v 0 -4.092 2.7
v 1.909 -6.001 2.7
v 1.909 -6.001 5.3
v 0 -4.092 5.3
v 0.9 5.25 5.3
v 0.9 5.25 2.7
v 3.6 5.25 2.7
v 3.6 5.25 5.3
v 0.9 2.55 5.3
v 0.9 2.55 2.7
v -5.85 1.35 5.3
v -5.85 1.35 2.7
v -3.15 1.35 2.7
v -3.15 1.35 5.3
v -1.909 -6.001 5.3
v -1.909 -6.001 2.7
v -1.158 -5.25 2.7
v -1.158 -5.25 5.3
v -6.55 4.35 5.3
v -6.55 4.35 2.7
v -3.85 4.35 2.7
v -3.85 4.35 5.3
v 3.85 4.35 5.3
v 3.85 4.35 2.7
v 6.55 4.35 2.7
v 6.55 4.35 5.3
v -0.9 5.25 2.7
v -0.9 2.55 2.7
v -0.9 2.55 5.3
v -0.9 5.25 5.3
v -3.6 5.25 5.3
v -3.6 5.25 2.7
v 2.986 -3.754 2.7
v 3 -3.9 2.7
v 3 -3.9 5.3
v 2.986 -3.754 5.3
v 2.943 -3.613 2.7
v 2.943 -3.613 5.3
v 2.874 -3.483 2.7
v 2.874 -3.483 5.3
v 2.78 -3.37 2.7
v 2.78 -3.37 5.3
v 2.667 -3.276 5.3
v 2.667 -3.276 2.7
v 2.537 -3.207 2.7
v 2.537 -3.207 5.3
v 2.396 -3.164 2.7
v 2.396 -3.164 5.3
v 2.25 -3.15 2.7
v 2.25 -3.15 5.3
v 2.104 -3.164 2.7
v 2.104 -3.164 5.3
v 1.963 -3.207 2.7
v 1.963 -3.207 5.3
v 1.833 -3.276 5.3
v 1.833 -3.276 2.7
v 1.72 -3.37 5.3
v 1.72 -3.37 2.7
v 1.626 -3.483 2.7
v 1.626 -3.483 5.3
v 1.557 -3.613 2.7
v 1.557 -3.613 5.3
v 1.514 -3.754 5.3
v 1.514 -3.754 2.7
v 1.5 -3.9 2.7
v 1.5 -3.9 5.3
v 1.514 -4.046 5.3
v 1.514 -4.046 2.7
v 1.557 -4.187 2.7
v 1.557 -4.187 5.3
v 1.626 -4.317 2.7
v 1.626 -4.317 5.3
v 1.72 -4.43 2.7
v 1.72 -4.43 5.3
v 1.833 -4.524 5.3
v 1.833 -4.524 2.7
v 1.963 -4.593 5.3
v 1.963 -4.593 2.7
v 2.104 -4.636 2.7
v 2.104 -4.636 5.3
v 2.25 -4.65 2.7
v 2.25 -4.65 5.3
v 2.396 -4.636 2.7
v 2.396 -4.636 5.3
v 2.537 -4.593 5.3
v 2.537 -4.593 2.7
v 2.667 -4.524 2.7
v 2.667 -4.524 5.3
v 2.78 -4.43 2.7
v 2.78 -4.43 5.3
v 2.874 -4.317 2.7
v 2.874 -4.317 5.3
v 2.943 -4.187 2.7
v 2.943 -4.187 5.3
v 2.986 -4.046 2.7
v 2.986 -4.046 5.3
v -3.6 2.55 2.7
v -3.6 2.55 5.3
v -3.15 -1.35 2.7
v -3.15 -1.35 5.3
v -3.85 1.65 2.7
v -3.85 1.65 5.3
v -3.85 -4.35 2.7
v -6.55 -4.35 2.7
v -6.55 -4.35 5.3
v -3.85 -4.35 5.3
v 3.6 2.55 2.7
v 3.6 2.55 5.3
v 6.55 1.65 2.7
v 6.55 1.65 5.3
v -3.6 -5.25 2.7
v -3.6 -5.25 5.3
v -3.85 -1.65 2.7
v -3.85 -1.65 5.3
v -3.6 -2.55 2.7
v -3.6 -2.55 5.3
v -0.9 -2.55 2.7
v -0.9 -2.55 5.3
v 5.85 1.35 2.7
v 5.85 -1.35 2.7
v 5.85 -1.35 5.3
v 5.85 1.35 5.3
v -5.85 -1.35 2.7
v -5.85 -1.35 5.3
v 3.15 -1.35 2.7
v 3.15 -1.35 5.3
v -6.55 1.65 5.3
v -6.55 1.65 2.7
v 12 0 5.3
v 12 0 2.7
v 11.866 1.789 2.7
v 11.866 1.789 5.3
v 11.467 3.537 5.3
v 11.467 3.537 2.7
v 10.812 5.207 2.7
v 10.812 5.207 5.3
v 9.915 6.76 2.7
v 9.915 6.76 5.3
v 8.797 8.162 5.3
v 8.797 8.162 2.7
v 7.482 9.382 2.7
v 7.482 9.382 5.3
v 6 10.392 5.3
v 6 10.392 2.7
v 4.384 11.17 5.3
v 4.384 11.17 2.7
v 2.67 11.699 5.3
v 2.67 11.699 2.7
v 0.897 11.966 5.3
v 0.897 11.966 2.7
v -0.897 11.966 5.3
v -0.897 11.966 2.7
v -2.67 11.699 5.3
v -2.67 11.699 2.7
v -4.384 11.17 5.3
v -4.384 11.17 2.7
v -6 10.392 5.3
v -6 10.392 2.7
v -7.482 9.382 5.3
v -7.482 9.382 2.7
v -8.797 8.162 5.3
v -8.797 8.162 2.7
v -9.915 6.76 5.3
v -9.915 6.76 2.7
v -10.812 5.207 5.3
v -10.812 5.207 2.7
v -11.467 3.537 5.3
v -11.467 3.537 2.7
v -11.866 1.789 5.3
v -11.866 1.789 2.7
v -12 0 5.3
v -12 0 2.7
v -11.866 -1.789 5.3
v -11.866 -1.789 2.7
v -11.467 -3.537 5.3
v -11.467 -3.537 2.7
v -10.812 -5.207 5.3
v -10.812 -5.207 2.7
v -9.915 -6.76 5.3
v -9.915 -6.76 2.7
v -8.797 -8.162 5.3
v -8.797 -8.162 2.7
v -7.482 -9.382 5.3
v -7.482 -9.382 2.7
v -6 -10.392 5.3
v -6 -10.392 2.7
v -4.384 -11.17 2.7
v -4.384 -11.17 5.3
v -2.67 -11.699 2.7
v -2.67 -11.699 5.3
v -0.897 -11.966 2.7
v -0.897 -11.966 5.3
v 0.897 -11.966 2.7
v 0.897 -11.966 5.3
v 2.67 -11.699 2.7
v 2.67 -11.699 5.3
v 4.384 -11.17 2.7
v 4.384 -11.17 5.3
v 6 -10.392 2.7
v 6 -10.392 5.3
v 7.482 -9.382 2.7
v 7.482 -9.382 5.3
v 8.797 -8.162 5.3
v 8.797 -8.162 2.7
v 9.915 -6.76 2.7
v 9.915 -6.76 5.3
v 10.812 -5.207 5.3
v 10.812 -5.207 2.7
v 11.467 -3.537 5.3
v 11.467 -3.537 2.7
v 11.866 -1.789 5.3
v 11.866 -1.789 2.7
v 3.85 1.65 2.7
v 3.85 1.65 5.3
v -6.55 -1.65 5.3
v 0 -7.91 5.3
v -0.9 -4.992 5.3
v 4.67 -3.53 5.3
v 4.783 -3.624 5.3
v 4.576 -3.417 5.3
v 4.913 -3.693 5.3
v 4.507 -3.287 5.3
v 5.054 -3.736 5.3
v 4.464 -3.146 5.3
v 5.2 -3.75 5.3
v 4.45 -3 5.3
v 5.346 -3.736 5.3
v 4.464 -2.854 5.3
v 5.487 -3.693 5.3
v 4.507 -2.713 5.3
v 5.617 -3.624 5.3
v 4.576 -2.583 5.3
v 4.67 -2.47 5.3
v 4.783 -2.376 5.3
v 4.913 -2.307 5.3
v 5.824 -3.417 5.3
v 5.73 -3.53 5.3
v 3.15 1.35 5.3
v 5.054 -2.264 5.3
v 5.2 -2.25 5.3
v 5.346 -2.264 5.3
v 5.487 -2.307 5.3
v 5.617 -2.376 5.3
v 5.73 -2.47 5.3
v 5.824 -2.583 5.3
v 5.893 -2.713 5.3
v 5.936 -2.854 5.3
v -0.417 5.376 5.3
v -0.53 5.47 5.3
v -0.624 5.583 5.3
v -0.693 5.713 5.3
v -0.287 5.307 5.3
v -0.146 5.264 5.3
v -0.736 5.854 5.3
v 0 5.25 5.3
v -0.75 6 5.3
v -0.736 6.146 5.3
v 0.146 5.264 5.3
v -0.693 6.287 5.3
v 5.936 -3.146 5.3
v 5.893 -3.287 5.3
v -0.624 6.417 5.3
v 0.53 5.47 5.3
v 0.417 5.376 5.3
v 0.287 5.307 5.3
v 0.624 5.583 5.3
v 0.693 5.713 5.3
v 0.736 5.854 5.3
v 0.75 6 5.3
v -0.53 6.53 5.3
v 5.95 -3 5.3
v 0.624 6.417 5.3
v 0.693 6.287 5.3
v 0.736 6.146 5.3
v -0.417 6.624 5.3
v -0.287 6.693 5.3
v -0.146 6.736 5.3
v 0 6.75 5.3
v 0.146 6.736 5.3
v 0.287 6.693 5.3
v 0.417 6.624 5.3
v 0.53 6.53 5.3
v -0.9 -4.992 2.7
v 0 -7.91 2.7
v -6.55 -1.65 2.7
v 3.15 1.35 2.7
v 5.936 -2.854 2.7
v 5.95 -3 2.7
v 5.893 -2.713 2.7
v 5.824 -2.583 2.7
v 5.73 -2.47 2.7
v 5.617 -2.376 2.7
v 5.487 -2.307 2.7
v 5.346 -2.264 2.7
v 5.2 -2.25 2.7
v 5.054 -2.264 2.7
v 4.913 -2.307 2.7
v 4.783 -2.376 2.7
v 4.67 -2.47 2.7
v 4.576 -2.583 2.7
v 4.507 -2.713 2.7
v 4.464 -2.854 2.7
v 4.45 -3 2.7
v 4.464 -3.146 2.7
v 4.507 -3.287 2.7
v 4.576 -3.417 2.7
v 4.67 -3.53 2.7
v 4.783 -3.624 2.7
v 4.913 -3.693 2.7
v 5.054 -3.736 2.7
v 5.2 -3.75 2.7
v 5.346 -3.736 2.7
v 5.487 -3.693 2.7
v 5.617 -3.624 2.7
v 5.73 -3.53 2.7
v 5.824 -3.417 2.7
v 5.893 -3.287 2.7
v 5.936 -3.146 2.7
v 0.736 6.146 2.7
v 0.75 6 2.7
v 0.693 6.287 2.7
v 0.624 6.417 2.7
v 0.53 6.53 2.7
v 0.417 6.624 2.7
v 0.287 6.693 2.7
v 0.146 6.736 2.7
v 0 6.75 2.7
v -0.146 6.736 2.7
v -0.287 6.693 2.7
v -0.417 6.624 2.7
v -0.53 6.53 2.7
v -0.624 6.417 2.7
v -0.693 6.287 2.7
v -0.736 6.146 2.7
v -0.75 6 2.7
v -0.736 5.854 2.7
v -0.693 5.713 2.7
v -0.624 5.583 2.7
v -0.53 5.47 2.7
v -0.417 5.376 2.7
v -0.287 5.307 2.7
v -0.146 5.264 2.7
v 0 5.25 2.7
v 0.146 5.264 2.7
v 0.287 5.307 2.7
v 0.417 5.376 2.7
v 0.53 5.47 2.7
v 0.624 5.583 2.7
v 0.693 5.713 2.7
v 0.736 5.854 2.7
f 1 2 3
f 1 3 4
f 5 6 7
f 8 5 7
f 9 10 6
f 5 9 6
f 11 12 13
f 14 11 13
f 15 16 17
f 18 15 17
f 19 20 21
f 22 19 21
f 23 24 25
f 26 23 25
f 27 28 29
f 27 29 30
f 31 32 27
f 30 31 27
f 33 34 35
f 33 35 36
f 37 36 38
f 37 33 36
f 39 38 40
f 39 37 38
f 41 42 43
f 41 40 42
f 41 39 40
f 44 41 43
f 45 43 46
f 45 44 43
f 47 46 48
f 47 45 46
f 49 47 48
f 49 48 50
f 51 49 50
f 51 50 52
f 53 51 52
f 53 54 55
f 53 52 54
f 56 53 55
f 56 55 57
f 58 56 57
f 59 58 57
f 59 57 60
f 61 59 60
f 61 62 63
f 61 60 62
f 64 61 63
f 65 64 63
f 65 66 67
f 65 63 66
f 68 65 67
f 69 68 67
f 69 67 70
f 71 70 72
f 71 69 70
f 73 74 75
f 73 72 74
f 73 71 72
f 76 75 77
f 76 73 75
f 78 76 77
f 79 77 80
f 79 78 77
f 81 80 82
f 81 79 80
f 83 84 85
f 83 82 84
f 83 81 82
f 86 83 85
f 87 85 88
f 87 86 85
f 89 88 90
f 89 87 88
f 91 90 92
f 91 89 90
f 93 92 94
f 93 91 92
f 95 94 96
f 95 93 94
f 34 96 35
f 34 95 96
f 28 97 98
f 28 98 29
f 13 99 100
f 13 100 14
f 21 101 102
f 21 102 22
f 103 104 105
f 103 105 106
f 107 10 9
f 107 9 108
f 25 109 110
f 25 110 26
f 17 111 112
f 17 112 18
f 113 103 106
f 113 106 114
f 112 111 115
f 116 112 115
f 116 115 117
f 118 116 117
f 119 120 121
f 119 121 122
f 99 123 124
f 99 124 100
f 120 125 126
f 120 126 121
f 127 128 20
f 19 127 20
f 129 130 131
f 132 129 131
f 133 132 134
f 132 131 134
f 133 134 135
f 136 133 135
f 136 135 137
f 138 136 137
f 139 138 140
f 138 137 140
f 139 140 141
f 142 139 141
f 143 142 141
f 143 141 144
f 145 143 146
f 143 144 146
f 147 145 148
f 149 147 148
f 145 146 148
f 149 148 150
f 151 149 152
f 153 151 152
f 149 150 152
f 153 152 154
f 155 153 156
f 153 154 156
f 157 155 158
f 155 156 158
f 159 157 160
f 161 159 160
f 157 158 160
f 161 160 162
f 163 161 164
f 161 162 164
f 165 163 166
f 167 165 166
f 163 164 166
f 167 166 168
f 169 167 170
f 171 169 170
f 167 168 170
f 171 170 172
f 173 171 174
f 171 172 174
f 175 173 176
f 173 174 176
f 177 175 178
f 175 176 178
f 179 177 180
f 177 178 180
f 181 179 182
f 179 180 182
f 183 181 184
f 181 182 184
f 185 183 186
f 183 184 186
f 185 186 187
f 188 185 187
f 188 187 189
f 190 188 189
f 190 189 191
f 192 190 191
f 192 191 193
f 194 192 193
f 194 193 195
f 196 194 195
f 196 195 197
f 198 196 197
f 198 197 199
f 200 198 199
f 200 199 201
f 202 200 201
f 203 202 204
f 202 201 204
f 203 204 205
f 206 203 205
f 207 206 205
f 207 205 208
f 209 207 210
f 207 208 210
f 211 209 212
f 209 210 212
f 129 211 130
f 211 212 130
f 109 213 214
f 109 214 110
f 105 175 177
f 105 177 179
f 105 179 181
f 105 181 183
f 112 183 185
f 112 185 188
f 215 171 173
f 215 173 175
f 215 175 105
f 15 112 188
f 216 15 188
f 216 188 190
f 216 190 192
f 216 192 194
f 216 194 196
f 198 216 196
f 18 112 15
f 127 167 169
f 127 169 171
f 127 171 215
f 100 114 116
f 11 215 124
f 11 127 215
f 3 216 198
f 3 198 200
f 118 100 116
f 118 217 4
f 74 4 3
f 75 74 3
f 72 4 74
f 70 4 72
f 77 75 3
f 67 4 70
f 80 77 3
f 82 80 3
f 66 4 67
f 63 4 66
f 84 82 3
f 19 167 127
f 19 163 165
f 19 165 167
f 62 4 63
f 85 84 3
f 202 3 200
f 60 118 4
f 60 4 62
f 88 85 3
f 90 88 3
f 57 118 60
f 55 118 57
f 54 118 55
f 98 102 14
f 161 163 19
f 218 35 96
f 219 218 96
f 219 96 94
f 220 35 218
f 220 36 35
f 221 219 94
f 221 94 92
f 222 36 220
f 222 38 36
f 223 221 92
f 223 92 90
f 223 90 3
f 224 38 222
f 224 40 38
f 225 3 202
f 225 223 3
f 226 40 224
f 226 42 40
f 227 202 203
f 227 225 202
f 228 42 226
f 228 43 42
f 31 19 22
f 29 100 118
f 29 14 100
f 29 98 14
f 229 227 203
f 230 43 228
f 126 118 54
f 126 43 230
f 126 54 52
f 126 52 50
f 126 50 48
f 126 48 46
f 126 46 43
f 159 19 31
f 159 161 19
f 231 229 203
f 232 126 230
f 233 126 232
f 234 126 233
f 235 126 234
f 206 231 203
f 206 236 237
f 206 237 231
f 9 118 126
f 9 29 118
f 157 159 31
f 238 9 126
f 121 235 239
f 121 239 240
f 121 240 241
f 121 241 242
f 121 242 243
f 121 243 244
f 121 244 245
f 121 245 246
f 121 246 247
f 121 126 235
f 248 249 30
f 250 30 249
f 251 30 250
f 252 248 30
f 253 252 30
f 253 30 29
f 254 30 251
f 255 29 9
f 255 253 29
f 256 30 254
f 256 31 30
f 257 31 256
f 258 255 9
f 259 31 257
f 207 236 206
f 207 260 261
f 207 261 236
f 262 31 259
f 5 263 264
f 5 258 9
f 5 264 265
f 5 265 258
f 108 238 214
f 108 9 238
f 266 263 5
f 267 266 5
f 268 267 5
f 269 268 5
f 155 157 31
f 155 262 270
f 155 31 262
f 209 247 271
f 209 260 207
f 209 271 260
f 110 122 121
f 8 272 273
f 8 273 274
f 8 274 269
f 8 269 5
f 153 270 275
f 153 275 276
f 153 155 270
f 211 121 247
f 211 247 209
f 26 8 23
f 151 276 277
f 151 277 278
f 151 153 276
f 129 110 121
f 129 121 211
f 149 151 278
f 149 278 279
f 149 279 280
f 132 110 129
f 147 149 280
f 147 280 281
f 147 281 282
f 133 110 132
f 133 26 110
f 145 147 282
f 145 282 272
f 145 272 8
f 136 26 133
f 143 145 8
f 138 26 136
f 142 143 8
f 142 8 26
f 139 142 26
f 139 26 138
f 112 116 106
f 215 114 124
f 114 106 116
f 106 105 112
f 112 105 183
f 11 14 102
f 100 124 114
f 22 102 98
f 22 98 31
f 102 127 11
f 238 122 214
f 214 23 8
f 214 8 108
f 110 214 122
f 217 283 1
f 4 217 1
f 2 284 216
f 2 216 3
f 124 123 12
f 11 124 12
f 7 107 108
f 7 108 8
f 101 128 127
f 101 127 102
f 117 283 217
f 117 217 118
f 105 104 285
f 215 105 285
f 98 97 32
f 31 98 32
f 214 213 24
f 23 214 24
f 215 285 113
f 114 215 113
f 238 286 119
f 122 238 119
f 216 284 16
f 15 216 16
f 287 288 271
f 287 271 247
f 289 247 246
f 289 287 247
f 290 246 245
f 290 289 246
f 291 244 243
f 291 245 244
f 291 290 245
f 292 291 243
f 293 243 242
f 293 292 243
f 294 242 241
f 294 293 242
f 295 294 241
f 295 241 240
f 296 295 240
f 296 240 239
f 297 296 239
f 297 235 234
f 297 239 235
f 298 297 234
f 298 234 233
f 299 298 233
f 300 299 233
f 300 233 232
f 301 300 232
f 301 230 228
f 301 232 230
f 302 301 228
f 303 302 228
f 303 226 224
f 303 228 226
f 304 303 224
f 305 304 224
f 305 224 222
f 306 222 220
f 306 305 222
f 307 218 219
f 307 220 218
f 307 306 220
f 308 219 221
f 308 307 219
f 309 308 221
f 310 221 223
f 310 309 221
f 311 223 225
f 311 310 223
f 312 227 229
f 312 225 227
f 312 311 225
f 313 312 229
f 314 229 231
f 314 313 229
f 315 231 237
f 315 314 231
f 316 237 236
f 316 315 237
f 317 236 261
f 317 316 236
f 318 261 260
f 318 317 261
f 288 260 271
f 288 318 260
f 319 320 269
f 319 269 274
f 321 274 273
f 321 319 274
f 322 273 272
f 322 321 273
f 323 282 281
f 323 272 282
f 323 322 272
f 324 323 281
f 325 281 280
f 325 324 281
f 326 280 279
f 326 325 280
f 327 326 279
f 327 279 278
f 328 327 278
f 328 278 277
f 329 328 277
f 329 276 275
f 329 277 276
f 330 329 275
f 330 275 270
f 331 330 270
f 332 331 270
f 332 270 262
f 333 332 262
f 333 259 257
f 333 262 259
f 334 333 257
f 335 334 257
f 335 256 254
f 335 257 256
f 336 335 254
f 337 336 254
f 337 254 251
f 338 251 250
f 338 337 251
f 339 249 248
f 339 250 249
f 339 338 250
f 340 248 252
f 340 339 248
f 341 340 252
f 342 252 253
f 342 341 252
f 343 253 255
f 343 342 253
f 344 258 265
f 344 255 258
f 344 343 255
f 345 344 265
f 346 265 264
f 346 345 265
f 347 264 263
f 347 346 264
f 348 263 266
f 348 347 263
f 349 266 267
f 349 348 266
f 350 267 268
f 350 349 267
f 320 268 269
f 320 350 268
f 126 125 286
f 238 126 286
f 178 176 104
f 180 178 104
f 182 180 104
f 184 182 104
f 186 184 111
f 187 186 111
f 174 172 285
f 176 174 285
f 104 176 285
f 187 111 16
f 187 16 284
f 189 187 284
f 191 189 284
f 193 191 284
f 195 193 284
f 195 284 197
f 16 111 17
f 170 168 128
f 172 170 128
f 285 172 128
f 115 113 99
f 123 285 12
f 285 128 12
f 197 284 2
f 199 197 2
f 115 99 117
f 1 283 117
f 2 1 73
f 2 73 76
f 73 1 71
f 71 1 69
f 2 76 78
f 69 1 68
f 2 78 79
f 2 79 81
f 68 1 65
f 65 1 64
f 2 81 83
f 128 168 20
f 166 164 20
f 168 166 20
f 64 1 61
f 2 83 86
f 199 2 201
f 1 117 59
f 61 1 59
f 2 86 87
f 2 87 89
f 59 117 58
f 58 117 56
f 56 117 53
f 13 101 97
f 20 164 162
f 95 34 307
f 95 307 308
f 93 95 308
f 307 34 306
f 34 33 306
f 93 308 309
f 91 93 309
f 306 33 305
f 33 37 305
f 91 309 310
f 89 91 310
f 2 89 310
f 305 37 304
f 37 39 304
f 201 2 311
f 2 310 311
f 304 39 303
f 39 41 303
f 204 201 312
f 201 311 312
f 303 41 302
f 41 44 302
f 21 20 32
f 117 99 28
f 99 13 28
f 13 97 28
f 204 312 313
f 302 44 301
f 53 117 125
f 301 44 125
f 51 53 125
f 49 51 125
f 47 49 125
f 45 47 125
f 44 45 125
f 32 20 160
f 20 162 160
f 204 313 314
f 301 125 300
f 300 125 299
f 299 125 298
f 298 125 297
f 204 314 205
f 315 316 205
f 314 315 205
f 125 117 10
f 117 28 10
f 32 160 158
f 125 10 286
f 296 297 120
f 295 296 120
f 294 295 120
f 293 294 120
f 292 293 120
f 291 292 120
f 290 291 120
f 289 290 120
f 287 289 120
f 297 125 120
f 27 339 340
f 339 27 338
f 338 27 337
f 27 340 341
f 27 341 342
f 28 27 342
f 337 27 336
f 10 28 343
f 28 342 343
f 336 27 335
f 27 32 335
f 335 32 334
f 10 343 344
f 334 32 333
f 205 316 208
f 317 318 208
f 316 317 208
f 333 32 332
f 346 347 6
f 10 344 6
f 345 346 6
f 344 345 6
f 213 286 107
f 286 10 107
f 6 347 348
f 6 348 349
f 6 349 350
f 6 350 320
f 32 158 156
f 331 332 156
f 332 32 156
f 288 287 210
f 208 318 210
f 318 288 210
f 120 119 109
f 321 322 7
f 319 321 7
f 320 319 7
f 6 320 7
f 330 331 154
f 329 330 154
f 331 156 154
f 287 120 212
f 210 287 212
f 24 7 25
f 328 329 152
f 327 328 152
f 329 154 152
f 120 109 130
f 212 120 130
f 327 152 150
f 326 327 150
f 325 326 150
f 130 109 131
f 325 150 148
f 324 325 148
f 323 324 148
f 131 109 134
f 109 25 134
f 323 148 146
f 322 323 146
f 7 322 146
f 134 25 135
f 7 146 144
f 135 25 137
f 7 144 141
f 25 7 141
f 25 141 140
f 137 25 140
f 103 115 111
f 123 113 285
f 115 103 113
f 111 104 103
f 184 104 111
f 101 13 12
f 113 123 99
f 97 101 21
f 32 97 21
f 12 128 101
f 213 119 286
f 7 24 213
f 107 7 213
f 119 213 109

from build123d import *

# Parameters (mm, degrees)
BOX018_W               = 2.7
BOX018_H               = 2.7
BOX018_DEPTH           = 2.8
BOX021_W               = 2.7
BOX021_H               = 2.7
BOX021_DEPTH           = 2.8
BOX022_W               = 2.7
BOX022_H               = 2.7
BOX022_DEPTH           = 2.8
BOX023_W               = 2.7
BOX023_H               = 2.7
BOX023_DEPTH           = 2.8
BOX024_W               = 2.7
BOX024_H               = 2.7
BOX024_DEPTH           = 2.8
BOX025_W               = 2.7
BOX025_H               = 2.7
BOX025_DEPTH           = 2.8
BOX026_W               = 2.7
BOX026_H               = 2.7
BOX026_DEPTH           = 2.8
BOX019_W               = 2.7
BOX019_H               = 2.7
BOX019_DEPTH           = 2.8
BOX019_PLACEMENT_ANGLE = 45
BOX020_W               = 2.7
BOX020_H               = 2.7
BOX020_DEPTH           = 2.8
CYLINDER050_R          = 0.75
CYLINDER050_DEPTH      = 10
CYLINDER051_R          = 0.75
CYLINDER051_DEPTH      = 10
CYLINDER049_R          = 0.75
CYLINDER049_DEPTH      = 10
CYLINDER048_R          = 12
CYLINDER048_DEPTH      = 2.6


with BuildPart() as cube018:
    # Box018 → Box018 (new body)
    with BuildSketch(Plane(origin=(-3.6, 2.55, 2.6), x_dir=(1, 0, 0), z_dir=(0, 0, 1))):
        with Locations((1.35, 1.35)):
            Rectangle(BOX018_W, BOX018_H)
    extrude(amount=BOX018_DEPTH)


with BuildPart() as cube021:
    # Box021 → Box021 (new body)
    with BuildSketch(Plane(origin=(-6.55, -4.35, 2.6), x_dir=(1, 0, 0), z_dir=(0, 0, 1))):
        with Locations((1.35, 1.35)):
            Rectangle(BOX021_W, BOX021_H)
    extrude(amount=BOX021_DEPTH)


with BuildPart() as cube022:
    # Box022 → Box022 (new body)
    with BuildSketch(Plane(origin=(-5.85, -1.35, 2.6), x_dir=(1, 0, 0), z_dir=(0, 0, 1))):
        with Locations((1.35, 1.35)):
            Rectangle(BOX022_W, BOX022_H)
    extrude(amount=BOX022_DEPTH)


with BuildPart() as cube023:
    # Box023 → Box023 (new body)
    with BuildSketch(Plane(origin=(-6.55, 1.65, 2.6), x_dir=(1, 0, 0), z_dir=(0, 0, 1))):
        with Locations((1.35, 1.35)):
            Rectangle(BOX023_W, BOX023_H)
    extrude(amount=BOX023_DEPTH)


with BuildPart() as cube024:
    # Box024 → Box024 (new body)
    with BuildSketch(Plane(origin=(0.9, 2.55, 2.6), x_dir=(1, 0, 0), z_dir=(0, 0, 1))):
        with Locations((1.35, 1.35)):
            Rectangle(BOX024_W, BOX024_H)
    extrude(amount=BOX024_DEPTH)


with BuildPart() as cube025:
    # Box025 → Box025 (new body)
    with BuildSketch(Plane(origin=(3.85, 1.65, 2.6), x_dir=(1, 0, 0), z_dir=(0, 0, 1))):
        with Locations((1.35, 1.35)):
            Rectangle(BOX025_W, BOX025_H)
    extrude(amount=BOX025_DEPTH)


with BuildPart() as cube026:
    # Box026 → Box026 (new body)
    with BuildSketch(Plane(origin=(3.15, -1.35, 2.6), x_dir=(1, 0, 0), z_dir=(0, 0, 1))):
        with Locations((1.35, 1.35)):
            Rectangle(BOX026_W, BOX026_H)
    extrude(amount=BOX026_DEPTH)


with BuildPart() as cube019:
    # Box019 → Box019 (new body)
    with BuildSketch(Plane.XY):
        with Locations((1.35, 1.35)):
            Rectangle(BOX019_W, BOX019_H)
    extrude(amount=BOX019_DEPTH)


with BuildPart() as cube019_1:
    # Box019 placement: moved
    add(cube019.part.moved(Location((0, -7.91, 2.6))).rotate(Axis((0, -7.91, 2.6), (0, 0, 1)), BOX019_PLACEMENT_ANGLE))


with BuildPart() as fusion019:
    # Box020 → Box020 (new body)
    with BuildSketch(Plane(origin=(-3.6, -5.25, 2.6), x_dir=(1, 0, 0), z_dir=(0, 0, 1))):
        with Locations((1.35, 1.35)):
            Rectangle(BOX020_W, BOX020_H)
    extrude(amount=BOX020_DEPTH)

    # Fusion019: union Cube019
    add(cube019_1.part)


with BuildPart() as cylinder051:
    # Cylinder050 → Cylinder050 (new body)
    with BuildSketch(Plane(origin=(0, 6, 0), x_dir=(1, 0, 0), z_dir=(0, 0, 1))):
        Circle(CYLINDER050_R)
    extrude(amount=CYLINDER050_DEPTH)


with BuildPart() as cylinder048:
    # Cylinder051 → Cylinder051 (new body)
    with BuildSketch(Plane(origin=(2.25, -3.9, 0), x_dir=(1, 0, 0), z_dir=(0, 0, 1))):
        Circle(CYLINDER051_R)
    extrude(amount=CYLINDER051_DEPTH)


with BuildPart() as compound001:
    # Cylinder049 → Cylinder049 (new body)
    with BuildSketch(Plane(origin=(5.2, -3, 0), x_dir=(1, 0, 0), z_dir=(0, 0, 1))):
        Circle(CYLINDER049_R)
    extrude(amount=CYLINDER049_DEPTH)

    # Compound001: union Cube018, Cube021, Cube022, Cube023, Cube024, Cube025, Cube026, Fusion019, Cylinder051, Cylinder048
    add(cube018.part)
    add(cube021.part)
    add(cube022.part)
    add(cube023.part)
    add(cube024.part)
    add(cube025.part)
    add(cube026.part)
    add(fusion019.part)
    add(cylinder051.part)
    add(cylinder048.part)


with BuildPart() as pcb_solder_jig:
    # Cylinder048 → Cylinder048 (new body)
    with BuildSketch(Plane.XY.offset(2.7)):
        Circle(CYLINDER048_R)
    extrude(amount=CYLINDER048_DEPTH)

    # Cut013010: cut Compound001
    add(compound001.part, mode=Mode.SUBTRACT)


solid = pcb_solder_jig.part
